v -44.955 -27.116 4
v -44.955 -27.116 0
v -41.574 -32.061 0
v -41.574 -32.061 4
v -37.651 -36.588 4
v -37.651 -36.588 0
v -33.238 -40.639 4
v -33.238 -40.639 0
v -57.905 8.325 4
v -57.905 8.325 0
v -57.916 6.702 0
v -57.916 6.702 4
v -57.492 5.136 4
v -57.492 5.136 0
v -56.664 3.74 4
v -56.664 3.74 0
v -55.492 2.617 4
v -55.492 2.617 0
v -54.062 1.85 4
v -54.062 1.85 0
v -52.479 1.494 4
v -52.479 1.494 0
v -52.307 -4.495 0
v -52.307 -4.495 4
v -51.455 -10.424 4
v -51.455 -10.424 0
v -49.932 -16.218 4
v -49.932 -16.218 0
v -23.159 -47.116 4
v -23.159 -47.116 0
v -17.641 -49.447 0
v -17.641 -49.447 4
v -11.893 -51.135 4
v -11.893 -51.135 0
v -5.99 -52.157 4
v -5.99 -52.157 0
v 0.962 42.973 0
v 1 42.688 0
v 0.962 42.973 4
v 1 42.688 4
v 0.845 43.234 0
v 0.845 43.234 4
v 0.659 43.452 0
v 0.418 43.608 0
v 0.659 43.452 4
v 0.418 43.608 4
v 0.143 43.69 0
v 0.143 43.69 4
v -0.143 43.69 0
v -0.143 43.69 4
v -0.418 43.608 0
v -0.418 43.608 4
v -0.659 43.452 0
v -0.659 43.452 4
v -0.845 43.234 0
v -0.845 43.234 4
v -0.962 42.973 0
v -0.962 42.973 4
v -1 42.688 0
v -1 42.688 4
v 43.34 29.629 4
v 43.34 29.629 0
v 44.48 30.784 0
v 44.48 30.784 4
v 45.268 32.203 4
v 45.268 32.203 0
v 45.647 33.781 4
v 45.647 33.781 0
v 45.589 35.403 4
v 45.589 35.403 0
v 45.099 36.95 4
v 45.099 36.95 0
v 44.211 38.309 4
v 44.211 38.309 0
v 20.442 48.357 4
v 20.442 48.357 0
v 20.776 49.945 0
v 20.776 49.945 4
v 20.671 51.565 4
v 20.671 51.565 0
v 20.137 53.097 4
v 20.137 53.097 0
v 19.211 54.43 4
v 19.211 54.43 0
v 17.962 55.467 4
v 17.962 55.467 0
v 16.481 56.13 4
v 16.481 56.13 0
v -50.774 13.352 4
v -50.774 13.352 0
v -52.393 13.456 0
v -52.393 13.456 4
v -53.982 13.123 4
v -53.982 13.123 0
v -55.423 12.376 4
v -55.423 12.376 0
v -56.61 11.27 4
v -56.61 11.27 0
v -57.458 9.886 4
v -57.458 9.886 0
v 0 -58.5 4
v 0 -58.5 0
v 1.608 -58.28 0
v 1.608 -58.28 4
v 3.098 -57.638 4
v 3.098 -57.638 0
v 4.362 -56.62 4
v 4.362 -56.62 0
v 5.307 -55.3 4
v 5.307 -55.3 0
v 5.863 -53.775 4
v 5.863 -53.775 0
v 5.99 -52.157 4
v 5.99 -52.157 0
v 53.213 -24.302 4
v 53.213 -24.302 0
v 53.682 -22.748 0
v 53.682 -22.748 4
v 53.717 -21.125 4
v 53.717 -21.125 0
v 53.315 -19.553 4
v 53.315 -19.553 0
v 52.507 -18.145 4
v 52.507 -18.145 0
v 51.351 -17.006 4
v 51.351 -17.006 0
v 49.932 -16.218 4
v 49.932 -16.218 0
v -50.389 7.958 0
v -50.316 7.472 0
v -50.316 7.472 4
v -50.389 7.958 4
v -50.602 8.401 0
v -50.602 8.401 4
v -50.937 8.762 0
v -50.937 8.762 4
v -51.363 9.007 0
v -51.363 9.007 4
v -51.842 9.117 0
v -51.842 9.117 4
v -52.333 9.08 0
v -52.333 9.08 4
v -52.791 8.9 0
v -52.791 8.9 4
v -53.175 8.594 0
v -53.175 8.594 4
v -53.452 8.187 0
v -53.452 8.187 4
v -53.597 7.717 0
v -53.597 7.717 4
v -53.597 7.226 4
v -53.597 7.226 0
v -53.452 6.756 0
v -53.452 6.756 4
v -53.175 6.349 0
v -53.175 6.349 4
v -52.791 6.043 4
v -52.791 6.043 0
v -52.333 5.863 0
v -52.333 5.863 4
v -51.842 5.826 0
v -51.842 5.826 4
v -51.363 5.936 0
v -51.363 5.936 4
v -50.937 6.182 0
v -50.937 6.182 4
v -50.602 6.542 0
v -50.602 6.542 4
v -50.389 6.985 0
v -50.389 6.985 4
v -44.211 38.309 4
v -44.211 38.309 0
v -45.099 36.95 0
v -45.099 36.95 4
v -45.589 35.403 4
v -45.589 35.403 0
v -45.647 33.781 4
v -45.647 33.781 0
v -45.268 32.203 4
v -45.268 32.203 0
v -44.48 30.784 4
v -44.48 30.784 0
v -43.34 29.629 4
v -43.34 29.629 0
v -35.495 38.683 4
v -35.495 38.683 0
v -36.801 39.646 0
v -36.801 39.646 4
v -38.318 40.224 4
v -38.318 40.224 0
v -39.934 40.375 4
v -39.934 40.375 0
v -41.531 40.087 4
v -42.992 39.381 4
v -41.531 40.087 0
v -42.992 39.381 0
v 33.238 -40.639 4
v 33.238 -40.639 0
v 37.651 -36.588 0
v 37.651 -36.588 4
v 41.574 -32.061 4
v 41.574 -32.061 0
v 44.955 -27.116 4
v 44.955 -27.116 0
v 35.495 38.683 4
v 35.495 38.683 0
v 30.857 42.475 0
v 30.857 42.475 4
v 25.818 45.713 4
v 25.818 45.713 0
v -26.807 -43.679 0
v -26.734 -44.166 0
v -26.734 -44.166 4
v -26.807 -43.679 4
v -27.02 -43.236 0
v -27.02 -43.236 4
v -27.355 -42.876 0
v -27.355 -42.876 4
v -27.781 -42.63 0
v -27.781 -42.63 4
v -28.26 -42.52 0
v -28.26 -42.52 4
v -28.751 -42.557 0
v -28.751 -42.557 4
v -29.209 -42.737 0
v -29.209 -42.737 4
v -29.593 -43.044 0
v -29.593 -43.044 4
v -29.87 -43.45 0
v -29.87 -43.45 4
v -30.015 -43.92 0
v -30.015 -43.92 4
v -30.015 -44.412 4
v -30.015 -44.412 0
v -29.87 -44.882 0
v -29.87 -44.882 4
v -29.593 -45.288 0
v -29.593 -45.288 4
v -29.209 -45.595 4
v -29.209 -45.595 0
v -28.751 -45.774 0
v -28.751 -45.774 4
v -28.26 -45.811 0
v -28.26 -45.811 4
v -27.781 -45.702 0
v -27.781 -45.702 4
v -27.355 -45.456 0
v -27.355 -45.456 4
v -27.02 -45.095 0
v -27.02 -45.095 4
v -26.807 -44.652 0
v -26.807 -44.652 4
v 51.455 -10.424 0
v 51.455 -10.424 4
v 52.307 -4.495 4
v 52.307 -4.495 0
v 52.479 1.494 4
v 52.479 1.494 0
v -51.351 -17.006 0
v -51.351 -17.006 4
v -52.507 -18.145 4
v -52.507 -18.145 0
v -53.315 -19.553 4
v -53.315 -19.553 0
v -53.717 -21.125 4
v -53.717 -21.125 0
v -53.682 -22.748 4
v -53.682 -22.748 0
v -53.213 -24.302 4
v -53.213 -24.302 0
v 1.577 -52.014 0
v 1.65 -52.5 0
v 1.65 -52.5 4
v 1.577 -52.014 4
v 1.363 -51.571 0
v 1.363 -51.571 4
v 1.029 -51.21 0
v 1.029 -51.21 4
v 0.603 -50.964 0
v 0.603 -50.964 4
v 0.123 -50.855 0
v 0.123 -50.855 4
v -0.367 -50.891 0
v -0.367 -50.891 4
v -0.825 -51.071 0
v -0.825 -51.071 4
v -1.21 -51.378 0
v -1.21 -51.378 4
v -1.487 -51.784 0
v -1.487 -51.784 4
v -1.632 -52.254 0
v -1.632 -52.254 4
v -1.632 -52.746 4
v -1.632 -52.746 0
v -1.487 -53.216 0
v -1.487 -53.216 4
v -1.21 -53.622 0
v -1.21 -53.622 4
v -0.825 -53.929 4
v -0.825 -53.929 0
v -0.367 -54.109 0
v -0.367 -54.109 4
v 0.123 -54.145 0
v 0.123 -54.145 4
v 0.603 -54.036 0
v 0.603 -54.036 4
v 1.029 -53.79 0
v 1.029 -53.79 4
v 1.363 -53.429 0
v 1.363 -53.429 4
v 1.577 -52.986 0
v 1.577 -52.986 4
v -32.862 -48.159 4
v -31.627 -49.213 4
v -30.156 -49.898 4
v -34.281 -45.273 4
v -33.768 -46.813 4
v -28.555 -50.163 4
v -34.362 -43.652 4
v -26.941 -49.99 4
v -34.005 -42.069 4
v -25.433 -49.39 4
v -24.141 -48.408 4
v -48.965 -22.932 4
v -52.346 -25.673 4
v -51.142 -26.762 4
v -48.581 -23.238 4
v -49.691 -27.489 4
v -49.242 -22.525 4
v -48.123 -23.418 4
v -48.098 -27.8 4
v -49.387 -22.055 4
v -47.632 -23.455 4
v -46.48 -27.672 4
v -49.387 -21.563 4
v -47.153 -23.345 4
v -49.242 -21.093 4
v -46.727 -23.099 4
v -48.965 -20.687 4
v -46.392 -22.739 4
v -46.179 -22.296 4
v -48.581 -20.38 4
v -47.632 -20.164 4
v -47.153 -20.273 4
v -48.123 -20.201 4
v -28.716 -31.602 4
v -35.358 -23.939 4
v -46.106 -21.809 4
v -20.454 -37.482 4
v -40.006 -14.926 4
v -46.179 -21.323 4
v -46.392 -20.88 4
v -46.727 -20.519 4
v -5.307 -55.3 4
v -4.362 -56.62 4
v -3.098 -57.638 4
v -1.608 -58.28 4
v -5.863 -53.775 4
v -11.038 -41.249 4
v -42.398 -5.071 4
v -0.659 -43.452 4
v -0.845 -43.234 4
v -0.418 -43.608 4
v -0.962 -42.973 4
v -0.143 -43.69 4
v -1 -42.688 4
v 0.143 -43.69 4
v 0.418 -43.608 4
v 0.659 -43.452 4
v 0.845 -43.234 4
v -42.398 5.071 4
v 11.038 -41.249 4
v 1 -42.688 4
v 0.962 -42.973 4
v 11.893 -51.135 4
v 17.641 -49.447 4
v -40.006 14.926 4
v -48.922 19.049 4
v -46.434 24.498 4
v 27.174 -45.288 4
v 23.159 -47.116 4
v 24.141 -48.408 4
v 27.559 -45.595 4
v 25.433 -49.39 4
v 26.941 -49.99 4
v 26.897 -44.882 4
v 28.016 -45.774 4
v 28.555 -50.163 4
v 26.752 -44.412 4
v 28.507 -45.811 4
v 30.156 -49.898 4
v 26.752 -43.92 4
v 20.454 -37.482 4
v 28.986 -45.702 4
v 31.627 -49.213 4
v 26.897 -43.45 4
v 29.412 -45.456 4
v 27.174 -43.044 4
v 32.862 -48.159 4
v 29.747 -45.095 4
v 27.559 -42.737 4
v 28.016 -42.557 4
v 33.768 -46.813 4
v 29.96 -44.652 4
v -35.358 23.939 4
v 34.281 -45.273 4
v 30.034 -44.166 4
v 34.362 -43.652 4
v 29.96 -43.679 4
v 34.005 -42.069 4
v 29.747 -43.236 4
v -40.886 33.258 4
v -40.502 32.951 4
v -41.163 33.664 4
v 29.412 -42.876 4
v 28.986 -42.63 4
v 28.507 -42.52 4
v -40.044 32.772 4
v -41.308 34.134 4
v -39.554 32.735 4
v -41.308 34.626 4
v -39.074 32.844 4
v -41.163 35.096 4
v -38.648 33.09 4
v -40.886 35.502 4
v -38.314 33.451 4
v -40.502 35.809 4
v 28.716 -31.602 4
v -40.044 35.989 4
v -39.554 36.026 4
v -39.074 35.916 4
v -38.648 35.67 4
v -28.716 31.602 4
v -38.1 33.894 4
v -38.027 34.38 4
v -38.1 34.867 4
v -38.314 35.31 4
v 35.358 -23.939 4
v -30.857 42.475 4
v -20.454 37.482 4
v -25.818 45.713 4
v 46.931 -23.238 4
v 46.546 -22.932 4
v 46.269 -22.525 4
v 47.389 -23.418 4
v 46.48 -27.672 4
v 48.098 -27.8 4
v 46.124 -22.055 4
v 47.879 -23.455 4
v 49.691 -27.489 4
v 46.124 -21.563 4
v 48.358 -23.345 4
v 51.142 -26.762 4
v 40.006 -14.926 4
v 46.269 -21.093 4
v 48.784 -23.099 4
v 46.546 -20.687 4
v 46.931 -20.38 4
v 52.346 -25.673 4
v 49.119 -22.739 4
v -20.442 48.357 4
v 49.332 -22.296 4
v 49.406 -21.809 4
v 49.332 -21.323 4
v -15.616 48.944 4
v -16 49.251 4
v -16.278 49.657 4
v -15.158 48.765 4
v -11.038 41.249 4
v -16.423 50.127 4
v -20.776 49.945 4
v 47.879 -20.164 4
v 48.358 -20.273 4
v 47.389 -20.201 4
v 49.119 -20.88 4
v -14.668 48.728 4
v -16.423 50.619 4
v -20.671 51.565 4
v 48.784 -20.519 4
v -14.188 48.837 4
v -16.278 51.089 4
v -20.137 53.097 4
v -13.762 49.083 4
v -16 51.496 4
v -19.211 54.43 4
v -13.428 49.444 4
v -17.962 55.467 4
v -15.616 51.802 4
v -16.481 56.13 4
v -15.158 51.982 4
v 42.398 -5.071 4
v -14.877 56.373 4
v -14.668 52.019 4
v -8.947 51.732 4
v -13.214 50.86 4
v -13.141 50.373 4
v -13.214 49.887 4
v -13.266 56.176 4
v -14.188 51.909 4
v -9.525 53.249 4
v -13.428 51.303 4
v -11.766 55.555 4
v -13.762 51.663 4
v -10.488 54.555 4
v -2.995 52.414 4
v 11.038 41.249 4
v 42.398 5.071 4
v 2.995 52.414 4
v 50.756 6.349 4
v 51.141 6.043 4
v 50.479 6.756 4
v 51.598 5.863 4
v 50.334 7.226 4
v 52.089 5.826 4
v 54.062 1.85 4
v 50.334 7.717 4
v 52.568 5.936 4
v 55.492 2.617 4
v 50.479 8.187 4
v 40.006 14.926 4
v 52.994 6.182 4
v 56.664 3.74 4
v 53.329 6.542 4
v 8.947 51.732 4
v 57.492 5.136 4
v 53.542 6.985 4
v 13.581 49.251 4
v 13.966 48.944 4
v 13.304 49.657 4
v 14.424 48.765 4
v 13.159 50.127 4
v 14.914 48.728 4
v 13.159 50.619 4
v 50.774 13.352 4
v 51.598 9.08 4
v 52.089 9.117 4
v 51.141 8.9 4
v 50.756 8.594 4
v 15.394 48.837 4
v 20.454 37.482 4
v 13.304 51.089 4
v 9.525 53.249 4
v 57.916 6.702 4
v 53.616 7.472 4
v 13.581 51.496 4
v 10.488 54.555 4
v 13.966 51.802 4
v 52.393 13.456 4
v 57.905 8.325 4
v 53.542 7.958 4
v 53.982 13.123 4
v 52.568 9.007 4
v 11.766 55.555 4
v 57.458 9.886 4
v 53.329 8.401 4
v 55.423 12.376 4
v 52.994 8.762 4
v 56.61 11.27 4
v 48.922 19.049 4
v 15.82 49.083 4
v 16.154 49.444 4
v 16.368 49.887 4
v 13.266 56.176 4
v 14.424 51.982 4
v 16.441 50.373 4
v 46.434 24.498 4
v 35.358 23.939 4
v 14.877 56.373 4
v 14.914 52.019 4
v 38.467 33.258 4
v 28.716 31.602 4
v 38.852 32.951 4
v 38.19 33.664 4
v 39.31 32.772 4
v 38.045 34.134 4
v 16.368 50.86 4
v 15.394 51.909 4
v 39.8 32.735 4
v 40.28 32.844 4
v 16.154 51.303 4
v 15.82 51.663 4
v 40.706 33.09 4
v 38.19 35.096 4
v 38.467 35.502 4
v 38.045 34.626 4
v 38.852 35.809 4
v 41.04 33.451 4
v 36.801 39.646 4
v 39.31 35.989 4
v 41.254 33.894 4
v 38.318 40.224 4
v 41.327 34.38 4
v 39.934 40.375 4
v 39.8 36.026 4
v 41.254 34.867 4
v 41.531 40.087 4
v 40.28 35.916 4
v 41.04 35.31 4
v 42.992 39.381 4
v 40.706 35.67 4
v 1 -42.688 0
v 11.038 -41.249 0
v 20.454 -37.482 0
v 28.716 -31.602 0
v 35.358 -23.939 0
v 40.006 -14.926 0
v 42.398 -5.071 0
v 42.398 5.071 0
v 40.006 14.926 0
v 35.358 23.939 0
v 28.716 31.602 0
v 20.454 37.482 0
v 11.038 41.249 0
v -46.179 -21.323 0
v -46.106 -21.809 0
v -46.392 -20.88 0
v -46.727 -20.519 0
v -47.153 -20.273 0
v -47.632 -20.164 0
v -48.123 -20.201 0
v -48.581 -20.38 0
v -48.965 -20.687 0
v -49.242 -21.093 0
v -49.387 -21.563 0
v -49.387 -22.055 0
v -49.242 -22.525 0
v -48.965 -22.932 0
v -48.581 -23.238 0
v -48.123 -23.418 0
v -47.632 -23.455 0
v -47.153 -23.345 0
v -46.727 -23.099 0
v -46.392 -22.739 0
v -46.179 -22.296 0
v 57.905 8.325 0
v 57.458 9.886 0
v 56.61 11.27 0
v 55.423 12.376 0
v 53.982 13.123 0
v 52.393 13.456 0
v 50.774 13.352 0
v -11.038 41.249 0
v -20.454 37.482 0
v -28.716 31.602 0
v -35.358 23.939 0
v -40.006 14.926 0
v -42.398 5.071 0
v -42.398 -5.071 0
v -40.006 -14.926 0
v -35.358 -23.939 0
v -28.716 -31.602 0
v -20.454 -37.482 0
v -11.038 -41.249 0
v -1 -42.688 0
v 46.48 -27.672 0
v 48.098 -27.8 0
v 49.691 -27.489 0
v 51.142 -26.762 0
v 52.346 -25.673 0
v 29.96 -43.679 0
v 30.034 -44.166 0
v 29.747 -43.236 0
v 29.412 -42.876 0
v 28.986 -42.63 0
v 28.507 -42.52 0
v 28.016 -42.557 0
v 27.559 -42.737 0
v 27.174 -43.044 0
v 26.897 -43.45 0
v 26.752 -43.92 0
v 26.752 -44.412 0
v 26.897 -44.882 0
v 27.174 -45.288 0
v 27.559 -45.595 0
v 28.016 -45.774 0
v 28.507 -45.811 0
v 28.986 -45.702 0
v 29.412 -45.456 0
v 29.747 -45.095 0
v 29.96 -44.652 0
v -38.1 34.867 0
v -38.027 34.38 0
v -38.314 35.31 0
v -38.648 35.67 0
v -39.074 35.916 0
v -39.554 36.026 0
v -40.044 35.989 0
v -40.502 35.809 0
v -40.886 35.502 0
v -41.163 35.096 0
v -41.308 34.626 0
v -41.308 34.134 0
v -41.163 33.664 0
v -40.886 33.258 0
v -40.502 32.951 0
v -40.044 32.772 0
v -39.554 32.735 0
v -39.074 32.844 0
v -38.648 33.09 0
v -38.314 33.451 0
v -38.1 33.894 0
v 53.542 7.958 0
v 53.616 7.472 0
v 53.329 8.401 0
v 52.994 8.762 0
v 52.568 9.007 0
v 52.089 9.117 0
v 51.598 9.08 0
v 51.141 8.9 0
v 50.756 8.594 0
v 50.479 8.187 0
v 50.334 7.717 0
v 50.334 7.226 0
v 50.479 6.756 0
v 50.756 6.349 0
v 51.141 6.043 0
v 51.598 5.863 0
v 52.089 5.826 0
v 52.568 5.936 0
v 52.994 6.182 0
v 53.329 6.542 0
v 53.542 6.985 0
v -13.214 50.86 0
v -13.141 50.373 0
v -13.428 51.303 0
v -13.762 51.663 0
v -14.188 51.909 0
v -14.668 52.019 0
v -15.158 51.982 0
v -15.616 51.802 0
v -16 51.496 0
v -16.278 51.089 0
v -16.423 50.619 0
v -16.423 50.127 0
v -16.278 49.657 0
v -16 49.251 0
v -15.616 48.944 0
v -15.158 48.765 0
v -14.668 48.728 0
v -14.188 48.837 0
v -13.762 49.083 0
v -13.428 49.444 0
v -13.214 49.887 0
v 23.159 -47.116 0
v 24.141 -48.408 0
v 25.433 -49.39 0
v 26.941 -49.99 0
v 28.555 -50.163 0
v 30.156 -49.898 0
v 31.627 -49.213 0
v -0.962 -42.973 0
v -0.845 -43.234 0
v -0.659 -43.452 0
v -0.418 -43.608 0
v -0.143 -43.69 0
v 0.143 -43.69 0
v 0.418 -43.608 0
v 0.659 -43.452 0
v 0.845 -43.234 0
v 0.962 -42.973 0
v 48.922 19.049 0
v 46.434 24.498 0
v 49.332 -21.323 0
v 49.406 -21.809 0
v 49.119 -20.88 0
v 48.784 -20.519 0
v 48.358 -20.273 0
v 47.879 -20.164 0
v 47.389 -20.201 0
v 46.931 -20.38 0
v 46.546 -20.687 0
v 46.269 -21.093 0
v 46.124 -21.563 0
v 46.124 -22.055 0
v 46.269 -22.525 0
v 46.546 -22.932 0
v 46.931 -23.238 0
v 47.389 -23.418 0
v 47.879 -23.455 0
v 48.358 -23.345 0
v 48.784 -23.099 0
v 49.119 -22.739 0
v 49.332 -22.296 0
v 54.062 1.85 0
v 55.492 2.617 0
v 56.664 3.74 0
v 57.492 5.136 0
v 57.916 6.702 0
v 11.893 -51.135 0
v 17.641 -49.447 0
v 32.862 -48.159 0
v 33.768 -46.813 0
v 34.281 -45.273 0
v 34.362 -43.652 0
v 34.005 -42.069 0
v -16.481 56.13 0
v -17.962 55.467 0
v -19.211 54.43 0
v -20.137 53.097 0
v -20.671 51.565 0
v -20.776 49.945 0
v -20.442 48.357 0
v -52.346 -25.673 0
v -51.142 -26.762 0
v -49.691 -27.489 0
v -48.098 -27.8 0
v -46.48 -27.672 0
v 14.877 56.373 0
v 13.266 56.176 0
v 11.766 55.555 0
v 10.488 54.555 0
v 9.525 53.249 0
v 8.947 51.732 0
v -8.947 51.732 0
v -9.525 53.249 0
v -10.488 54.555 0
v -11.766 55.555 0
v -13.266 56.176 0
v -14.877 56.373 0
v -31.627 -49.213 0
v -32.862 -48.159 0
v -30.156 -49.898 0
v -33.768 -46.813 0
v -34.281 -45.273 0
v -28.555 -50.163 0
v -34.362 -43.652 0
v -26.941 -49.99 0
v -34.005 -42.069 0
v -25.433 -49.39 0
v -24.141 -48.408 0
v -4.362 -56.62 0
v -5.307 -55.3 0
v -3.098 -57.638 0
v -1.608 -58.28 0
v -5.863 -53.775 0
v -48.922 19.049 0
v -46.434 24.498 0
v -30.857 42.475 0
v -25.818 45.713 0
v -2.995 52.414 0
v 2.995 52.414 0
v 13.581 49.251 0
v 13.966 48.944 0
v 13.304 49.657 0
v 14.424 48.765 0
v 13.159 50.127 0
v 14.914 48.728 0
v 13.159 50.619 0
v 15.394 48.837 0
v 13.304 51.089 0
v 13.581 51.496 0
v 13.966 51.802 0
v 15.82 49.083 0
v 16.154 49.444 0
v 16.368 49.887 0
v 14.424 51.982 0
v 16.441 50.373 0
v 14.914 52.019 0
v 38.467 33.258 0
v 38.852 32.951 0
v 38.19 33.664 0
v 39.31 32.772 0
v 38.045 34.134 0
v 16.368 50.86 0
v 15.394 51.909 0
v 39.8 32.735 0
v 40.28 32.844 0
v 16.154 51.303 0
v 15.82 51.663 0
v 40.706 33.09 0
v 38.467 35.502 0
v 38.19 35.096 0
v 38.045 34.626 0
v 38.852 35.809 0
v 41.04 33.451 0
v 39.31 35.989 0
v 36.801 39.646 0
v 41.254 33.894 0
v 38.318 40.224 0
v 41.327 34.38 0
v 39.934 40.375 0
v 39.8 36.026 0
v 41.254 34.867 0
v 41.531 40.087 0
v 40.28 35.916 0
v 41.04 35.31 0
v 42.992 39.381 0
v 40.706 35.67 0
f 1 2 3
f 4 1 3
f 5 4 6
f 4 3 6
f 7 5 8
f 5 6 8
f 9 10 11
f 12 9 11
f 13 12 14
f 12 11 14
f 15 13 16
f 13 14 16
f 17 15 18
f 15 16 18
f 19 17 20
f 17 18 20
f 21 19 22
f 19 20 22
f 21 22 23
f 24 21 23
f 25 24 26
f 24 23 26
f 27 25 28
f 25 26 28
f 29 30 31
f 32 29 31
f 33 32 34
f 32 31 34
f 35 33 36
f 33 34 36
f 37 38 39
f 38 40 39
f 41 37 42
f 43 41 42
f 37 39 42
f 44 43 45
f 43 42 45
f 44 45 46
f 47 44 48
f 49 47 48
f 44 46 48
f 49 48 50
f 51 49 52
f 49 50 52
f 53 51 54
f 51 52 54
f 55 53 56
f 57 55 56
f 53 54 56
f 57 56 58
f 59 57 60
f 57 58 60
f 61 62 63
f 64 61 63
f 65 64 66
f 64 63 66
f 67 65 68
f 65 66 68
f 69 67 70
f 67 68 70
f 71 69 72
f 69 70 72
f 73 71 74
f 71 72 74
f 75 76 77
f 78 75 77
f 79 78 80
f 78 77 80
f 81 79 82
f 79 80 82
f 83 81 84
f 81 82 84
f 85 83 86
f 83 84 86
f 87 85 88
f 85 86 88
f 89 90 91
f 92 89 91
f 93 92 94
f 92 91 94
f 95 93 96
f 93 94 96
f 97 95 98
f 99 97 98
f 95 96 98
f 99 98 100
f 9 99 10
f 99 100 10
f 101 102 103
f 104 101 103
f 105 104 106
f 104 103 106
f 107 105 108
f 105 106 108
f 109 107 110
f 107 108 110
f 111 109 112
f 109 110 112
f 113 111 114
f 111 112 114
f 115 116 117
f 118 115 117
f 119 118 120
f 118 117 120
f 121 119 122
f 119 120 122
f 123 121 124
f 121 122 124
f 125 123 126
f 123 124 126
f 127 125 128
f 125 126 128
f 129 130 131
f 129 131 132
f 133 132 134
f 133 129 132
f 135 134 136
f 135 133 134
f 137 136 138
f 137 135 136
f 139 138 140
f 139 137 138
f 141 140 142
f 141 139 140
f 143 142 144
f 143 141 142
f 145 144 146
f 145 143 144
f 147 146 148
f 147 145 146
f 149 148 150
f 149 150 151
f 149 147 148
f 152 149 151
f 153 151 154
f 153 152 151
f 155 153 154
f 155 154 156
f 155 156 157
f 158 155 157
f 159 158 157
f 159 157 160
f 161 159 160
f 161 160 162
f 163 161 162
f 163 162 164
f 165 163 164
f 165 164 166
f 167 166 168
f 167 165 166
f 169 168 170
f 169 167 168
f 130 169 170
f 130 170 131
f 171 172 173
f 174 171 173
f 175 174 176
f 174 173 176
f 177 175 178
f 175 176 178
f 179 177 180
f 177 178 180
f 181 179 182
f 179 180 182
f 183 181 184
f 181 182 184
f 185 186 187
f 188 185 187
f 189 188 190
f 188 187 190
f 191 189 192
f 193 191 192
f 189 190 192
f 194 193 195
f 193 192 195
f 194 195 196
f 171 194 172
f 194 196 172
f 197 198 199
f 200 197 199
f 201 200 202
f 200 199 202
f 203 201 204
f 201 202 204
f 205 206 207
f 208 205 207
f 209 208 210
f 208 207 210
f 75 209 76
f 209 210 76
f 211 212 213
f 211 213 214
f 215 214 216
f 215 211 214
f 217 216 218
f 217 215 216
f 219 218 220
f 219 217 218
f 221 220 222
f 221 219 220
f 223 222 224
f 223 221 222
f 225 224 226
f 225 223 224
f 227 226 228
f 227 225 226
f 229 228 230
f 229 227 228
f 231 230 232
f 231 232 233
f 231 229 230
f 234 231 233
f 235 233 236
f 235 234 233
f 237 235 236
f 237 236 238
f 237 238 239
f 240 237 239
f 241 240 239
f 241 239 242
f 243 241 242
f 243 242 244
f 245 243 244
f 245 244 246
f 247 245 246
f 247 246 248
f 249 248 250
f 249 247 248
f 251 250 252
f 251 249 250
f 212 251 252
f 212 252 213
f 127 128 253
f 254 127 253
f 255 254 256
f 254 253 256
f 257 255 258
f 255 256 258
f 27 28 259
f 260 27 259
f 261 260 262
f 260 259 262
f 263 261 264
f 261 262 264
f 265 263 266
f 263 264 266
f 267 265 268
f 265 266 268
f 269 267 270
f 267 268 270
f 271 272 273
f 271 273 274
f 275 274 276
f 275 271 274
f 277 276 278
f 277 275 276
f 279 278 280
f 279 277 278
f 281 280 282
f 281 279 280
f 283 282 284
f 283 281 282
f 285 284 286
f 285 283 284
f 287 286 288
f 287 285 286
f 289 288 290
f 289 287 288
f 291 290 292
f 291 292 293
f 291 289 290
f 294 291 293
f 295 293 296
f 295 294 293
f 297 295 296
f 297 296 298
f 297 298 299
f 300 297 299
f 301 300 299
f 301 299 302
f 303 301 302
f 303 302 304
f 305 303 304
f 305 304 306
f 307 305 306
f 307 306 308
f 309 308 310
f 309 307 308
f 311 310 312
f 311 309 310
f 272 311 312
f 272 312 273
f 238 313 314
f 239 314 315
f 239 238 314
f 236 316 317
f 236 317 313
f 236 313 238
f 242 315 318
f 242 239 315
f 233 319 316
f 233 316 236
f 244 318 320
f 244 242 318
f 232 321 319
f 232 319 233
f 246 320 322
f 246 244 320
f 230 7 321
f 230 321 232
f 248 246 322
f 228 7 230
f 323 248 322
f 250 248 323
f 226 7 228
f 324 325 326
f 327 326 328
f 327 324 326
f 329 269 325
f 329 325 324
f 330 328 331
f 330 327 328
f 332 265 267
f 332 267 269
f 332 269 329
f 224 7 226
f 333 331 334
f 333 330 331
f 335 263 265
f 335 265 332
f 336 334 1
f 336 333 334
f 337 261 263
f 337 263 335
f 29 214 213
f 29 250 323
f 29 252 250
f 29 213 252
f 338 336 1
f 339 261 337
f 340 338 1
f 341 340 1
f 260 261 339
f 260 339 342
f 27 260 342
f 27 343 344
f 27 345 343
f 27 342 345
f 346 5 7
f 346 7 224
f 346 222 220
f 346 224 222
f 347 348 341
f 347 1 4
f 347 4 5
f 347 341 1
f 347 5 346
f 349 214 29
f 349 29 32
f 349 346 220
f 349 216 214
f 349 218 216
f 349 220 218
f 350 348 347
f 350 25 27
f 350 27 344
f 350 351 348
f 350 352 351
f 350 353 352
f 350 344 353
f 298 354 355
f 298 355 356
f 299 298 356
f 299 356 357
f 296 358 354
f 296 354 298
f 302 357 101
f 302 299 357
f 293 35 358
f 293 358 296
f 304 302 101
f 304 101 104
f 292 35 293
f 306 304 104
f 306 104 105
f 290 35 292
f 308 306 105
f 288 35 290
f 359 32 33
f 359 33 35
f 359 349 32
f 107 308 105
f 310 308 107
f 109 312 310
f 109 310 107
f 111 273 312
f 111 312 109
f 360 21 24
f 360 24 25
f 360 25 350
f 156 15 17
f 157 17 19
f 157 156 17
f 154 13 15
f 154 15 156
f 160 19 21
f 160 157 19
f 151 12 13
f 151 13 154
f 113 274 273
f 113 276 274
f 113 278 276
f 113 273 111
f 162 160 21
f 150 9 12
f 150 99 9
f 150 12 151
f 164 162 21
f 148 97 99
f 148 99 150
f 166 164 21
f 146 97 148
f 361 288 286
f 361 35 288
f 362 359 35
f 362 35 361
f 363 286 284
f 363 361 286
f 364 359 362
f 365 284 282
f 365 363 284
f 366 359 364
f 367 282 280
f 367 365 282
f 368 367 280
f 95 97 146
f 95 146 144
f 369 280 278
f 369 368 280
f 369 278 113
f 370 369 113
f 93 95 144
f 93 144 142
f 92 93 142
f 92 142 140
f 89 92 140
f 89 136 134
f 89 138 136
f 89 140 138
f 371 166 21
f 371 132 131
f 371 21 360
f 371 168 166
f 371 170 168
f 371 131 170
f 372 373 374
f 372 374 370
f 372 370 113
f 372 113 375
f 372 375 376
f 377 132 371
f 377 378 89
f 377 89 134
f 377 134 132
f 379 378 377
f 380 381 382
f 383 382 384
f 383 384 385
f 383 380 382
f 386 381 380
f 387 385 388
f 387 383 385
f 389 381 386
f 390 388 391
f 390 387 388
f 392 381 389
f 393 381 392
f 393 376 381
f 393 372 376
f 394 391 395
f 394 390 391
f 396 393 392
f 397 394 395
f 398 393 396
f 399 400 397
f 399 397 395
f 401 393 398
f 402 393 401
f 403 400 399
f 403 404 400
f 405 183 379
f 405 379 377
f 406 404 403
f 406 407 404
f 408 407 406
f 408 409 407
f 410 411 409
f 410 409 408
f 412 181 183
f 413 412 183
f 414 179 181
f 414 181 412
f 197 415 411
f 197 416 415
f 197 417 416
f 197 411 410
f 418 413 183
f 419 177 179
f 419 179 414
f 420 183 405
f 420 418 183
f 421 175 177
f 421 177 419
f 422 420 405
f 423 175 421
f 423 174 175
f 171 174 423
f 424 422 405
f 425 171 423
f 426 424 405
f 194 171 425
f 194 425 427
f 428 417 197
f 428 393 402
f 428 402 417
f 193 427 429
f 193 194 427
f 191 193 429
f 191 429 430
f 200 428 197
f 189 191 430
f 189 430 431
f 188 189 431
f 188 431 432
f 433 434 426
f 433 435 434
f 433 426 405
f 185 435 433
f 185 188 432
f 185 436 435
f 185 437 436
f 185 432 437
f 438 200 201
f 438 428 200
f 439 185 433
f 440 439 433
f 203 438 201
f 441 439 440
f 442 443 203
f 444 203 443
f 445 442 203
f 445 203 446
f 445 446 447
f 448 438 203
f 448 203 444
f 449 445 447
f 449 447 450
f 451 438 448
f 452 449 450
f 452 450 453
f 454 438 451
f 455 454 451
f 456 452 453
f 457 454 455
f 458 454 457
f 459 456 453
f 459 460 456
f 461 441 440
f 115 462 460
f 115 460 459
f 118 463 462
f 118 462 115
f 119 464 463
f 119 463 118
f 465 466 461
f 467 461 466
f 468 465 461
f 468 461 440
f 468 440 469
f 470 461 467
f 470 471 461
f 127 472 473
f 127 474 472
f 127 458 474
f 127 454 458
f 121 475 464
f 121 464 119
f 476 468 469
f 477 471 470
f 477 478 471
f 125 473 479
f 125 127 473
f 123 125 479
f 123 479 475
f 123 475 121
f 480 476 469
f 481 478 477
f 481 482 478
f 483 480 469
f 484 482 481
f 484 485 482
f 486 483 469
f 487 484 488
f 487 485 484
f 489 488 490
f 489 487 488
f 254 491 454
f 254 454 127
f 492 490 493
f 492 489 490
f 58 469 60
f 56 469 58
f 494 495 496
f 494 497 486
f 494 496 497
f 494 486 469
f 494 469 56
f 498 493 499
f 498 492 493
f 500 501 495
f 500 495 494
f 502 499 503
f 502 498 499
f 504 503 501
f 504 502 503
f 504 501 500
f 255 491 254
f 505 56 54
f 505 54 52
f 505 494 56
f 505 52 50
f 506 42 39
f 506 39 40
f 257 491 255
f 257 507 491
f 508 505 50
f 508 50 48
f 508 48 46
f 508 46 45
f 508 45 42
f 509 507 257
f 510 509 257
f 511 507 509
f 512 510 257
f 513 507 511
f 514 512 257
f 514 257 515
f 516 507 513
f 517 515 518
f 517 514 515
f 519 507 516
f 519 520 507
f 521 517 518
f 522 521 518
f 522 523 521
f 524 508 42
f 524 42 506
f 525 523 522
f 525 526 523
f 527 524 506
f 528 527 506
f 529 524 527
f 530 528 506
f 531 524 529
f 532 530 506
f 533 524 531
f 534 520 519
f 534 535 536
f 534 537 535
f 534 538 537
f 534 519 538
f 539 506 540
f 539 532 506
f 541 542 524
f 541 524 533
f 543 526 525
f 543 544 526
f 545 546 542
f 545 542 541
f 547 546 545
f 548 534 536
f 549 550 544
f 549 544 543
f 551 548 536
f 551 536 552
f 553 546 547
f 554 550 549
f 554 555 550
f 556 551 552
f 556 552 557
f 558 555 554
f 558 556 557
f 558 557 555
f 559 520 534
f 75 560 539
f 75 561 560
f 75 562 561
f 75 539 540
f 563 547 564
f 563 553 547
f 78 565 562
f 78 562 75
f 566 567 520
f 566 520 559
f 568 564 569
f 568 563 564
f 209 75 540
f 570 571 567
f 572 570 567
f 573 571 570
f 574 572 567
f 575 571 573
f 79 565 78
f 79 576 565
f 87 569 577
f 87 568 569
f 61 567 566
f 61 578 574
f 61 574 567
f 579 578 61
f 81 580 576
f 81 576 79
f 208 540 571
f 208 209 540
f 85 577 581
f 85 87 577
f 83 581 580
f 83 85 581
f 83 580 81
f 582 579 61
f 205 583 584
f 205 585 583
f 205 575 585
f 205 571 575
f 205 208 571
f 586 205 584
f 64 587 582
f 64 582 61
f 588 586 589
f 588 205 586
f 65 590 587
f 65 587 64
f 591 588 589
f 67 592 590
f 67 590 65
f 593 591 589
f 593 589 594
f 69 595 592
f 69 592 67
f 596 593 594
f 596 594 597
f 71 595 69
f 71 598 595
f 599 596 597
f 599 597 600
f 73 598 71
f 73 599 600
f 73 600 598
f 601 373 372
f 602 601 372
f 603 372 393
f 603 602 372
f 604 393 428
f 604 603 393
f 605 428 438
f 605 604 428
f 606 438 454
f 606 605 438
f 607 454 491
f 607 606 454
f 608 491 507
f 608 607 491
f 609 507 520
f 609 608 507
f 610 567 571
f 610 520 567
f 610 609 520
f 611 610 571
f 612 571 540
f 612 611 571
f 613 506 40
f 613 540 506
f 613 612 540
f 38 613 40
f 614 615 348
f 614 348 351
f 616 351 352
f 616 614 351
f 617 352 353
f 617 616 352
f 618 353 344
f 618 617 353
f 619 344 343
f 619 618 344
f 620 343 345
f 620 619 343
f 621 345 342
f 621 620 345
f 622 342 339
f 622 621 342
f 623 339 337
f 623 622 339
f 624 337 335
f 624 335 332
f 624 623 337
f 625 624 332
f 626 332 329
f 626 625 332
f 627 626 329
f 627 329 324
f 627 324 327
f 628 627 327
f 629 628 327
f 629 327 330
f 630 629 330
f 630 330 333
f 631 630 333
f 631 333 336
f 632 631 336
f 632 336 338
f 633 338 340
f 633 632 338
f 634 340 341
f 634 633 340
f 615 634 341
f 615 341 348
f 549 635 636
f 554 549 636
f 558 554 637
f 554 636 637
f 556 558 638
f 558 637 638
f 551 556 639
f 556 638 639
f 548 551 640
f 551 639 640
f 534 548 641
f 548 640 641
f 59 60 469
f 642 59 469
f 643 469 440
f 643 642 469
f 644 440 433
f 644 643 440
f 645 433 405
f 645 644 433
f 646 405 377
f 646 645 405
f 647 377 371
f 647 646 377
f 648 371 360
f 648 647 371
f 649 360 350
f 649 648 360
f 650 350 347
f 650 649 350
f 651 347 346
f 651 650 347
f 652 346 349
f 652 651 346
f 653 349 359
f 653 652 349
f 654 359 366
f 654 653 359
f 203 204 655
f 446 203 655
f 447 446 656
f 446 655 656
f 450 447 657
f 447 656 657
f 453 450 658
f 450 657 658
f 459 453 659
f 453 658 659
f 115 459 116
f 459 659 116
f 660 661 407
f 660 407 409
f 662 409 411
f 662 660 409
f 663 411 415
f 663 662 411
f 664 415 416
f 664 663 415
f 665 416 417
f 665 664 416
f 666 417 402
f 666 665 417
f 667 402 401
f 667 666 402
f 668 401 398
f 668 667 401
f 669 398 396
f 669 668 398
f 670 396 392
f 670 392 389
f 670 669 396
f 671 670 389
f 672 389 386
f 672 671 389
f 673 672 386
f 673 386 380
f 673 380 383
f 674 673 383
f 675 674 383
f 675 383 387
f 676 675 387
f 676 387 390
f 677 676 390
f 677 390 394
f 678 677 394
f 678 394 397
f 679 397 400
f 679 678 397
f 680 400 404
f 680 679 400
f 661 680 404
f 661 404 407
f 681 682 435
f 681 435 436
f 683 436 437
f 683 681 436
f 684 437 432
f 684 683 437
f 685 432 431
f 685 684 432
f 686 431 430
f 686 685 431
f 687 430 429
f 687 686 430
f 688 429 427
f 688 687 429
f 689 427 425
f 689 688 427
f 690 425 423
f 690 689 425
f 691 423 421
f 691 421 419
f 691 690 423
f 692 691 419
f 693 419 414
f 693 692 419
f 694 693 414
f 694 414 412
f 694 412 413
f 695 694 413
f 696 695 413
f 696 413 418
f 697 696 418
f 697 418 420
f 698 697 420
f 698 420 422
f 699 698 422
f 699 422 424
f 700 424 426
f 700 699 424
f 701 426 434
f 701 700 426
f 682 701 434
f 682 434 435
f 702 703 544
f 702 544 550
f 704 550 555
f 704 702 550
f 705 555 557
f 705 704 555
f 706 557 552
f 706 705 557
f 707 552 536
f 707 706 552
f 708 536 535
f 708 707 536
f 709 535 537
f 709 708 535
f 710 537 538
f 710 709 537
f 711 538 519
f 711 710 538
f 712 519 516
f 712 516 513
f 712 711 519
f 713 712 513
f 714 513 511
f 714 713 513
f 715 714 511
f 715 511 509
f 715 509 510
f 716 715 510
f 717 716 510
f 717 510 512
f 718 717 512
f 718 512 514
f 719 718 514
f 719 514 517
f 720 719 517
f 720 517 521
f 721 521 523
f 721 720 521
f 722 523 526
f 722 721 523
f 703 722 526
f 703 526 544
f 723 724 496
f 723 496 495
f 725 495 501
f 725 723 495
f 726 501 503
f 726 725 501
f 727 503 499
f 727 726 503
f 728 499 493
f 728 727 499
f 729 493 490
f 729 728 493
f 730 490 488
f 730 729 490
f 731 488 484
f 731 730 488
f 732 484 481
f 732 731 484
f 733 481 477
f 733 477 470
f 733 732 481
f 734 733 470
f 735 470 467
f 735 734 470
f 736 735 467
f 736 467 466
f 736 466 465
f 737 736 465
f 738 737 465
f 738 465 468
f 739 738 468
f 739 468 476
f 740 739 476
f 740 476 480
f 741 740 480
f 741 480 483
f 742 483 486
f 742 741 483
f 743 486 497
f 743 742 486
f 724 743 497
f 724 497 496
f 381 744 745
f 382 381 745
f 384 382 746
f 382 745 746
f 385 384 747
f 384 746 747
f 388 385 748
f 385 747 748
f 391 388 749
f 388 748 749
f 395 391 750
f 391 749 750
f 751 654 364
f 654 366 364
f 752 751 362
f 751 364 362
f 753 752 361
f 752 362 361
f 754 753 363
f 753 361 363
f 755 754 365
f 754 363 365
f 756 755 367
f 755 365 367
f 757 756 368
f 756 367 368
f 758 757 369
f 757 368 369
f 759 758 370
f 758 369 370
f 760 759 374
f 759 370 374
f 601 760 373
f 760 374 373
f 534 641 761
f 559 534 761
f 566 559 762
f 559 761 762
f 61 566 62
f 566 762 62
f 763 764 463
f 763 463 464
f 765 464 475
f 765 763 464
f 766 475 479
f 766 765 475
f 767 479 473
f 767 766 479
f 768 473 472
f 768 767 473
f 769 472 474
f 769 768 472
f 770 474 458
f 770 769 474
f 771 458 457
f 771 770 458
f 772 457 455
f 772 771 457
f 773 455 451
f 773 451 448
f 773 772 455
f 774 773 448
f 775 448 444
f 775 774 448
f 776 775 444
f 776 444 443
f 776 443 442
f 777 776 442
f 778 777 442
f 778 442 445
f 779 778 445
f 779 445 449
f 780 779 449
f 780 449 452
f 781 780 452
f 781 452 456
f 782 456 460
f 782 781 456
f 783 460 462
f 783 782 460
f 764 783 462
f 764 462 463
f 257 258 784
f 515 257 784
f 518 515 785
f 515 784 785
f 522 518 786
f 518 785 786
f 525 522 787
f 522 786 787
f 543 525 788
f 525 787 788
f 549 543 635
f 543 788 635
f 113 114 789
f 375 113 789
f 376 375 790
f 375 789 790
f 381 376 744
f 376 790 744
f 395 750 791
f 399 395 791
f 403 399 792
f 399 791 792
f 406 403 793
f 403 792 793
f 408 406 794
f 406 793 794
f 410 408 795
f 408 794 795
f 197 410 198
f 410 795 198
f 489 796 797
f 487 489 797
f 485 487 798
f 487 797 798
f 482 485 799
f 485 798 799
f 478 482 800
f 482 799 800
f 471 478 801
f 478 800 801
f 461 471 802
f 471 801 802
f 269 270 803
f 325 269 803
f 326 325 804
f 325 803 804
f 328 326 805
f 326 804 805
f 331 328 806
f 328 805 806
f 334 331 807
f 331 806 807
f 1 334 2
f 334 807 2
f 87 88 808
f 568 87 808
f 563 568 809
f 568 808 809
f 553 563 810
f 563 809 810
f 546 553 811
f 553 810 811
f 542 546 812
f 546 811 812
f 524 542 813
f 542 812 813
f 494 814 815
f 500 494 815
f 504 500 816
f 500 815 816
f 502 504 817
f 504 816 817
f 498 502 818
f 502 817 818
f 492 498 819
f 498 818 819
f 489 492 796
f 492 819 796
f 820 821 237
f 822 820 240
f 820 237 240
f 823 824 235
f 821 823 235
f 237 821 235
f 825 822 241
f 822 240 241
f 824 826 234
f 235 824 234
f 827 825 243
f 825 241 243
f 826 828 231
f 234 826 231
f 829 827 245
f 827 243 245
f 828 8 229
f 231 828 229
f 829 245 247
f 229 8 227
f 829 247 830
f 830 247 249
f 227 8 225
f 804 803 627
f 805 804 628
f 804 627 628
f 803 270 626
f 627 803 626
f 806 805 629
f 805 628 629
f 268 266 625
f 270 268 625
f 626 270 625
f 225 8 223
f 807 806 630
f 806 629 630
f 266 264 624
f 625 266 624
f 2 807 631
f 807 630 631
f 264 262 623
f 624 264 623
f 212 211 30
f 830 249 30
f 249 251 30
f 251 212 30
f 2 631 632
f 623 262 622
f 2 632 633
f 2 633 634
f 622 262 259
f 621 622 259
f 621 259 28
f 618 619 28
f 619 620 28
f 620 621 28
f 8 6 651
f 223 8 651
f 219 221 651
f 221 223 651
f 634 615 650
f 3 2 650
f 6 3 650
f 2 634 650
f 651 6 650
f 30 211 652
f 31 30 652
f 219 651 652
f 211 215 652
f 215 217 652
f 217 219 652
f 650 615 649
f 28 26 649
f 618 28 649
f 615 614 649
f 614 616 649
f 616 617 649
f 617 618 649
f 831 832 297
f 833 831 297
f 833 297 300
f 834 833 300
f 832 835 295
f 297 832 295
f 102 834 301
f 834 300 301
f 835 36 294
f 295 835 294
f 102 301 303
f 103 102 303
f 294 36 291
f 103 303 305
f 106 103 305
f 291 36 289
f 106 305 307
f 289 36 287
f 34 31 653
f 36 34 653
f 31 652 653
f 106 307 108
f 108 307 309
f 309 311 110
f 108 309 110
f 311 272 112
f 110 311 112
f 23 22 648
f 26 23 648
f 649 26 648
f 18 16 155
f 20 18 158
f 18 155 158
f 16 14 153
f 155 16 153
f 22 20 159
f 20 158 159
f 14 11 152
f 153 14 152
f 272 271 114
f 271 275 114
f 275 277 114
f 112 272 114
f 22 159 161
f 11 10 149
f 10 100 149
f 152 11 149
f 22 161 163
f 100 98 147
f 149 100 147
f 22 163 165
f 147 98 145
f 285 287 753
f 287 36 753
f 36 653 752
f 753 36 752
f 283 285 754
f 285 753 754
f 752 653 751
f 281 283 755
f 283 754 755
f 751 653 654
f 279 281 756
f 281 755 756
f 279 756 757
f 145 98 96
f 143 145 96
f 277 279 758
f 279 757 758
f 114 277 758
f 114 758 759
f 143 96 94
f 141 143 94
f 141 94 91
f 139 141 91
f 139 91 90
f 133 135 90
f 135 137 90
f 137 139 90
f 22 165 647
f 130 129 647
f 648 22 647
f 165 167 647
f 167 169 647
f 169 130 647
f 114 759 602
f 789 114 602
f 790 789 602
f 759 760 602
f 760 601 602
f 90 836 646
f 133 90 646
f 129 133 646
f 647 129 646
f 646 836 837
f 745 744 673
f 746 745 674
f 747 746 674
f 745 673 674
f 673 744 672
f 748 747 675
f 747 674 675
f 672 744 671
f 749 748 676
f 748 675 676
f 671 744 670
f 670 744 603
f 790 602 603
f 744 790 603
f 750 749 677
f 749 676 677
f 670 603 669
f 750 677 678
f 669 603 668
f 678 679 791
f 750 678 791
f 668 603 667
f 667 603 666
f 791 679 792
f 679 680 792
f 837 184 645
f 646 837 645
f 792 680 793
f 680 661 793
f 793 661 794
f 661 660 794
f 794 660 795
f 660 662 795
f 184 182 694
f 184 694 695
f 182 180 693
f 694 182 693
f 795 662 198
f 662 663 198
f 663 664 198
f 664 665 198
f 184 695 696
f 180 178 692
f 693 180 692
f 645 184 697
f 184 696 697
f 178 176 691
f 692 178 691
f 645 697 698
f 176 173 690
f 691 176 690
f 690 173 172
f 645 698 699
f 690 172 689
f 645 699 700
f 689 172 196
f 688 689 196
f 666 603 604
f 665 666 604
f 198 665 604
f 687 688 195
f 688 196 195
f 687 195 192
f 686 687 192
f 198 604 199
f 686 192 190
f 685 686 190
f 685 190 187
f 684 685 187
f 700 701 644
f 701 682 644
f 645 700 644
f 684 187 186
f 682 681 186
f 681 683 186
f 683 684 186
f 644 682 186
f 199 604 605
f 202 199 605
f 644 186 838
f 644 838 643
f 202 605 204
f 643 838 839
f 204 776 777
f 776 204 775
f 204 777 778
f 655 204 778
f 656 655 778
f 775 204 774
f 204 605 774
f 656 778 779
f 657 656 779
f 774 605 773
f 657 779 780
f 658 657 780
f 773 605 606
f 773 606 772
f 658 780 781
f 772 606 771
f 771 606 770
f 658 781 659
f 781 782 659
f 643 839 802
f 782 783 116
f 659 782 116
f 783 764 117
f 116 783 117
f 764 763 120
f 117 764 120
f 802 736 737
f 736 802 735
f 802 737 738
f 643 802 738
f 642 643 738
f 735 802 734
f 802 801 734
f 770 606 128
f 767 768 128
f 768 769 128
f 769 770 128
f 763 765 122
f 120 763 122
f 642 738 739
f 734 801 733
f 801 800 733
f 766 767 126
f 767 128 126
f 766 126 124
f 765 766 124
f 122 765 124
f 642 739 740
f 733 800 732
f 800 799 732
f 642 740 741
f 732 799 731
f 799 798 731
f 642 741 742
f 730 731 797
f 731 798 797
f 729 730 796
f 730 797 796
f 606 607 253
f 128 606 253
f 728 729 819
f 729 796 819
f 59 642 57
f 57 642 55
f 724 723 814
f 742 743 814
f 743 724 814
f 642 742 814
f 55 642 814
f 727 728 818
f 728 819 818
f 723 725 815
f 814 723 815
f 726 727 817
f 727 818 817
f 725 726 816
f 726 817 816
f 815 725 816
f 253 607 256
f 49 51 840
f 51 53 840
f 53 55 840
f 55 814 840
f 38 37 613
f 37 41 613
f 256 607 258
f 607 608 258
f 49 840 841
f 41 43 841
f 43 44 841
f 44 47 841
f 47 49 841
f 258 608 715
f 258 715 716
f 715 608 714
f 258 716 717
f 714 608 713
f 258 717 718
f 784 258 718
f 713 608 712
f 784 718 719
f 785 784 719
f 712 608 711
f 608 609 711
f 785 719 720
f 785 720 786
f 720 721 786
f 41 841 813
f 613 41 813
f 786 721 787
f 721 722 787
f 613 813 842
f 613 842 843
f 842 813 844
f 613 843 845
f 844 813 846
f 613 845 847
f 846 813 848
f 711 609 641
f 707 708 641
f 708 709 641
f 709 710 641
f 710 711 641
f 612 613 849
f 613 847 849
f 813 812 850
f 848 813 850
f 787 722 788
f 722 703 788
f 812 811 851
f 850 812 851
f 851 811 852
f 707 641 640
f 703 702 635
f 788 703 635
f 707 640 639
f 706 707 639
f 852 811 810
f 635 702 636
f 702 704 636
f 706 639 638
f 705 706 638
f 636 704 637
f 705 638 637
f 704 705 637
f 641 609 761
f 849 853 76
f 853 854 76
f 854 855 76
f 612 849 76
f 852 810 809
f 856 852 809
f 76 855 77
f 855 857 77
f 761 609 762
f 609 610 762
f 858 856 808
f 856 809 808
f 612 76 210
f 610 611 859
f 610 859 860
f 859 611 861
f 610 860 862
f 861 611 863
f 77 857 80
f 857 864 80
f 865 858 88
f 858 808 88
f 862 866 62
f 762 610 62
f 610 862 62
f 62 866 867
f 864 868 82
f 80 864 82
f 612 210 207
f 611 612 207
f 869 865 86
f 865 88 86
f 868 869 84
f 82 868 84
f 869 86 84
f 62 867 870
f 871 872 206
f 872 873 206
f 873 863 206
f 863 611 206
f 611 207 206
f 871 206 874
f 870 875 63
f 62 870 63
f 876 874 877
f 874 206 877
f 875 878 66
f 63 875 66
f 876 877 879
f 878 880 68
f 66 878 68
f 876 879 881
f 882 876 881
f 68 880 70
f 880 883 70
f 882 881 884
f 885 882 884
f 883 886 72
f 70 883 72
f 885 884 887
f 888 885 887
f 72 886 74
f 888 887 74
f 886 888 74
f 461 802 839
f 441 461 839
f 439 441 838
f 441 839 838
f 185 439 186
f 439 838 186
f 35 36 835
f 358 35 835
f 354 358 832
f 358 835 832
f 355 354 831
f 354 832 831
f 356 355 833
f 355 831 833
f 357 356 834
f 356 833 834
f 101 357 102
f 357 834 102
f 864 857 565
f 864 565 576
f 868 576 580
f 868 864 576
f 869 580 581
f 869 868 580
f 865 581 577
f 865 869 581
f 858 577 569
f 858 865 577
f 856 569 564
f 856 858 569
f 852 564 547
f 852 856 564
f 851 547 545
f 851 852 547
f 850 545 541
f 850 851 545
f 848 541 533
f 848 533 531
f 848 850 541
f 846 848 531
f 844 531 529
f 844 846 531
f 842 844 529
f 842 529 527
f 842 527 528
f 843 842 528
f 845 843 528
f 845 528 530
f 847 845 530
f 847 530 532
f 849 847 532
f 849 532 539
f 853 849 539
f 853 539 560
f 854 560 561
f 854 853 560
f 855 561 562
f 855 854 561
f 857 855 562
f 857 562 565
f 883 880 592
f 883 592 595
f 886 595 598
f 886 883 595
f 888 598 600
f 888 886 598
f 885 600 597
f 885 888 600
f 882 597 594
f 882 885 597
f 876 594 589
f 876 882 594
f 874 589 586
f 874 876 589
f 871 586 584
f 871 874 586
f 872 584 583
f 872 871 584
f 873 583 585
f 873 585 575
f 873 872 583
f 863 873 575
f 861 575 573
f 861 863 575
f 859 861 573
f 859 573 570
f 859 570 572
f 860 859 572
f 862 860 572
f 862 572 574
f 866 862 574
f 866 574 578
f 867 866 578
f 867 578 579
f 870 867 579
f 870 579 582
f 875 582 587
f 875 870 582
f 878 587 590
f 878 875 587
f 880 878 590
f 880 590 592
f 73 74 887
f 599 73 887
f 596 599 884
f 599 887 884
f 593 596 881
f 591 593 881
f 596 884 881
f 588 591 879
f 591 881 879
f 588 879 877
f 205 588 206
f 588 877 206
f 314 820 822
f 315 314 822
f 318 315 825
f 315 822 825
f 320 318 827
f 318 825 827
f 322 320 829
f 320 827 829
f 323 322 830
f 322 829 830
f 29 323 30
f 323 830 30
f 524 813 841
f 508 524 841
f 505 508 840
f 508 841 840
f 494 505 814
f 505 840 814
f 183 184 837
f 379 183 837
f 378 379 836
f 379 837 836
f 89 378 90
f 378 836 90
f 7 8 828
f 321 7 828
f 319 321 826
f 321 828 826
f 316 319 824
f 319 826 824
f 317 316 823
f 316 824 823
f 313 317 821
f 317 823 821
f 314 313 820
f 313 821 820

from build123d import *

# Parameters (mm, degrees)
SKETCH_1_R          = 42.7
SKETCH_1_R_2        = 1.65
EXTRUDE_1_DEPTH     = 4
SKETCH_2_R          = 1
CUT_EXTRUDE_1_DEPTH = 4


with BuildPart() as part:
    # 草图1 → 凸台-拉伸1 (new body)
    with BuildSketch(Plane.XY):
        with BuildLine():
            ThreePointArc((-57.90455435, 8.325418039), (-56.664135325, 3.740040393), (-52.478752132, 1.493510837))
            ThreePointArc((-52.478752132, 1.493510837), (-51.965625699, -7.471529009), (-49.932223308, -16.217986173))
            ThreePointArc((-49.932223308, -16.217986173), (-53.315148558, -19.552674205), (-53.213471728, -24.301778261))
            ThreePointArc((-53.213471728, -24.301778261), (-49.690922522, -27.488622249), (-44.95538855, -27.115734184))
            ThreePointArc((-44.95538855, -27.115734184), (-39.676852654, -34.380188532), (-33.237553958, -40.63883619))
            ThreePointArc((-33.237553958, -40.63883619), (-34.280583312, -45.27310175), (-31.627487821, -49.213331671))
            ThreePointArc((-31.627487821, -49.213331671), (-26.941192918, -49.989841552), (-23.159006743, -47.115925192))
            ThreePointArc((-23.159006743, -47.115925192), (-14.790959234, -50.373381115), (-5.990196072, -52.157142857))
            ThreePointArc((-5.990196072, -52.157142857), (-4.36217508, -56.619639374), (0, -58.5))
            ThreePointArc((0, -58.5), (4.36217508, -56.619639374), (5.990196072, -52.157142857))
            ThreePointArc((5.990196072, -52.157142857), (14.790959234, -50.373381115), (23.159006743, -47.115925192))
            ThreePointArc((23.159006743, -47.115925192), (26.941192918, -49.989841552), (31.627487821, -49.213331671))
            ThreePointArc((31.627487821, -49.213331671), (34.280583312, -45.27310175), (33.237553958, -40.63883619))
            ThreePointArc((33.237553958, -40.63883619), (39.676852654, -34.380188532), (44.95538855, -27.115734184))
            ThreePointArc((44.95538855, -27.115734184), (49.690922522, -27.488622249), (53.213471728, -24.301778261))
            ThreePointArc((53.213471728, -24.301778261), (53.315148558, -19.552674205), (49.932223308, -16.217986173))
            ThreePointArc((49.932223308, -16.217986173), (51.965625699, -7.471529009), (52.478752132, 1.493510837))
            ThreePointArc((52.478752132, 1.493510837), (56.664135325, 3.740040393), (57.90455435, 8.325418039))
            ThreePointArc((57.90455435, 8.325418039), (55.422530843, 12.375589248), (50.773764562, 13.351959864))
            ThreePointArc((50.773764562, 13.351959864), (47.755679756, 21.809288183), (43.34048271, 29.62857672))
            ThreePointArc((43.34048271, 29.62857672), (45.646885531, 33.781266636), (44.2113501, 38.309352936))
            ThreePointArc((44.2113501, 38.309352936), (39.933651182, 40.374690556), (35.494994318, 38.682752984))
            ThreePointArc((35.494994318, 38.682752984), (28.383642916, 44.165810474), (20.441916256, 48.35677884))
            ThreePointArc((20.441916256, 48.35677884), (20.137072107, 53.097179409), (16.481354575, 56.130338956))
            ThreePointArc((16.481354575, 56.130338956), (11.766119429, 55.555112887), (8.946814173, 51.732045351))
            ThreePointArc((8.946814173, 51.732045351), (0, 52.5), (-8.946814173, 51.732045351))
            ThreePointArc((-8.946814173, 51.732045351), (-11.766119429, 55.555112887), (-16.481354575, 56.130338956))
            ThreePointArc((-16.481354575, 56.130338956), (-20.137072107, 53.097179409), (-20.441916256, 48.35677884))
            ThreePointArc((-20.441916256, 48.35677884), (-28.383642916, 44.165810474), (-35.494994318, 38.682752984))
            ThreePointArc((-35.494994318, 38.682752984), (-39.933651182, 40.374690556), (-44.2113501, 38.309352936))
            ThreePointArc((-44.2113501, 38.309352936), (-45.646885531, 33.781266636), (-43.34048271, 29.62857672))
            ThreePointArc((-43.34048271, 29.62857672), (-47.755679756, 21.809288183), (-50.773764562, 13.351959864))
            ThreePointArc((-50.773764562, 13.351959864), (-55.422530843, 12.375589248), (-57.90455435, 8.325418039))
        make_face()
        Circle(SKETCH_1_R, mode=Mode.SUBTRACT)
        with Locations((-51.965625699, 7.471529009)):
            Circle(SKETCH_1_R_2, mode=Mode.SUBTRACT)
        with Locations((-39.676852654, 34.380188532)):
            Circle(SKETCH_1_R_2, mode=Mode.SUBTRACT)
        with Locations((-14.790959234, 50.373381115)):
            Circle(SKETCH_1_R_2, mode=Mode.SUBTRACT)
        with Locations((14.790959234, 50.373381115)):
            Circle(SKETCH_1_R_2, mode=Mode.SUBTRACT)
        with Locations((39.676852654, 34.380188532)):
            Circle(SKETCH_1_R_2, mode=Mode.SUBTRACT)
        with Locations((51.965625699, 7.471529009)):
            Circle(SKETCH_1_R_2, mode=Mode.SUBTRACT)
        with Locations((47.755679756, -21.809288183)):
            Circle(SKETCH_1_R_2, mode=Mode.SUBTRACT)
        with Locations((28.383642916, -44.165810474)):
            Circle(SKETCH_1_R_2, mode=Mode.SUBTRACT)
        with Locations((0, -52.5)):
            Circle(SKETCH_1_R_2, mode=Mode.SUBTRACT)
        with Locations((-28.383642916, -44.165810474)):
            Circle(SKETCH_1_R_2, mode=Mode.SUBTRACT)
        with Locations((-47.755679756, -21.809288183)):
            Circle(SKETCH_1_R_2, mode=Mode.SUBTRACT)
    extrude(amount=EXTRUDE_1_DEPTH)

    # 草图2 → 切除-拉伸1 (cut)
    with BuildSketch(Plane.XY.offset(4)):
        with Locations((0, -42.7)):
            Circle(SKETCH_2_R)
        with Locations((0, 42.7)):
            Circle(SKETCH_2_R)
    extrude(amount=-CUT_EXTRUDE_1_DEPTH, mode=Mode.SUBTRACT)


solid = part.part
